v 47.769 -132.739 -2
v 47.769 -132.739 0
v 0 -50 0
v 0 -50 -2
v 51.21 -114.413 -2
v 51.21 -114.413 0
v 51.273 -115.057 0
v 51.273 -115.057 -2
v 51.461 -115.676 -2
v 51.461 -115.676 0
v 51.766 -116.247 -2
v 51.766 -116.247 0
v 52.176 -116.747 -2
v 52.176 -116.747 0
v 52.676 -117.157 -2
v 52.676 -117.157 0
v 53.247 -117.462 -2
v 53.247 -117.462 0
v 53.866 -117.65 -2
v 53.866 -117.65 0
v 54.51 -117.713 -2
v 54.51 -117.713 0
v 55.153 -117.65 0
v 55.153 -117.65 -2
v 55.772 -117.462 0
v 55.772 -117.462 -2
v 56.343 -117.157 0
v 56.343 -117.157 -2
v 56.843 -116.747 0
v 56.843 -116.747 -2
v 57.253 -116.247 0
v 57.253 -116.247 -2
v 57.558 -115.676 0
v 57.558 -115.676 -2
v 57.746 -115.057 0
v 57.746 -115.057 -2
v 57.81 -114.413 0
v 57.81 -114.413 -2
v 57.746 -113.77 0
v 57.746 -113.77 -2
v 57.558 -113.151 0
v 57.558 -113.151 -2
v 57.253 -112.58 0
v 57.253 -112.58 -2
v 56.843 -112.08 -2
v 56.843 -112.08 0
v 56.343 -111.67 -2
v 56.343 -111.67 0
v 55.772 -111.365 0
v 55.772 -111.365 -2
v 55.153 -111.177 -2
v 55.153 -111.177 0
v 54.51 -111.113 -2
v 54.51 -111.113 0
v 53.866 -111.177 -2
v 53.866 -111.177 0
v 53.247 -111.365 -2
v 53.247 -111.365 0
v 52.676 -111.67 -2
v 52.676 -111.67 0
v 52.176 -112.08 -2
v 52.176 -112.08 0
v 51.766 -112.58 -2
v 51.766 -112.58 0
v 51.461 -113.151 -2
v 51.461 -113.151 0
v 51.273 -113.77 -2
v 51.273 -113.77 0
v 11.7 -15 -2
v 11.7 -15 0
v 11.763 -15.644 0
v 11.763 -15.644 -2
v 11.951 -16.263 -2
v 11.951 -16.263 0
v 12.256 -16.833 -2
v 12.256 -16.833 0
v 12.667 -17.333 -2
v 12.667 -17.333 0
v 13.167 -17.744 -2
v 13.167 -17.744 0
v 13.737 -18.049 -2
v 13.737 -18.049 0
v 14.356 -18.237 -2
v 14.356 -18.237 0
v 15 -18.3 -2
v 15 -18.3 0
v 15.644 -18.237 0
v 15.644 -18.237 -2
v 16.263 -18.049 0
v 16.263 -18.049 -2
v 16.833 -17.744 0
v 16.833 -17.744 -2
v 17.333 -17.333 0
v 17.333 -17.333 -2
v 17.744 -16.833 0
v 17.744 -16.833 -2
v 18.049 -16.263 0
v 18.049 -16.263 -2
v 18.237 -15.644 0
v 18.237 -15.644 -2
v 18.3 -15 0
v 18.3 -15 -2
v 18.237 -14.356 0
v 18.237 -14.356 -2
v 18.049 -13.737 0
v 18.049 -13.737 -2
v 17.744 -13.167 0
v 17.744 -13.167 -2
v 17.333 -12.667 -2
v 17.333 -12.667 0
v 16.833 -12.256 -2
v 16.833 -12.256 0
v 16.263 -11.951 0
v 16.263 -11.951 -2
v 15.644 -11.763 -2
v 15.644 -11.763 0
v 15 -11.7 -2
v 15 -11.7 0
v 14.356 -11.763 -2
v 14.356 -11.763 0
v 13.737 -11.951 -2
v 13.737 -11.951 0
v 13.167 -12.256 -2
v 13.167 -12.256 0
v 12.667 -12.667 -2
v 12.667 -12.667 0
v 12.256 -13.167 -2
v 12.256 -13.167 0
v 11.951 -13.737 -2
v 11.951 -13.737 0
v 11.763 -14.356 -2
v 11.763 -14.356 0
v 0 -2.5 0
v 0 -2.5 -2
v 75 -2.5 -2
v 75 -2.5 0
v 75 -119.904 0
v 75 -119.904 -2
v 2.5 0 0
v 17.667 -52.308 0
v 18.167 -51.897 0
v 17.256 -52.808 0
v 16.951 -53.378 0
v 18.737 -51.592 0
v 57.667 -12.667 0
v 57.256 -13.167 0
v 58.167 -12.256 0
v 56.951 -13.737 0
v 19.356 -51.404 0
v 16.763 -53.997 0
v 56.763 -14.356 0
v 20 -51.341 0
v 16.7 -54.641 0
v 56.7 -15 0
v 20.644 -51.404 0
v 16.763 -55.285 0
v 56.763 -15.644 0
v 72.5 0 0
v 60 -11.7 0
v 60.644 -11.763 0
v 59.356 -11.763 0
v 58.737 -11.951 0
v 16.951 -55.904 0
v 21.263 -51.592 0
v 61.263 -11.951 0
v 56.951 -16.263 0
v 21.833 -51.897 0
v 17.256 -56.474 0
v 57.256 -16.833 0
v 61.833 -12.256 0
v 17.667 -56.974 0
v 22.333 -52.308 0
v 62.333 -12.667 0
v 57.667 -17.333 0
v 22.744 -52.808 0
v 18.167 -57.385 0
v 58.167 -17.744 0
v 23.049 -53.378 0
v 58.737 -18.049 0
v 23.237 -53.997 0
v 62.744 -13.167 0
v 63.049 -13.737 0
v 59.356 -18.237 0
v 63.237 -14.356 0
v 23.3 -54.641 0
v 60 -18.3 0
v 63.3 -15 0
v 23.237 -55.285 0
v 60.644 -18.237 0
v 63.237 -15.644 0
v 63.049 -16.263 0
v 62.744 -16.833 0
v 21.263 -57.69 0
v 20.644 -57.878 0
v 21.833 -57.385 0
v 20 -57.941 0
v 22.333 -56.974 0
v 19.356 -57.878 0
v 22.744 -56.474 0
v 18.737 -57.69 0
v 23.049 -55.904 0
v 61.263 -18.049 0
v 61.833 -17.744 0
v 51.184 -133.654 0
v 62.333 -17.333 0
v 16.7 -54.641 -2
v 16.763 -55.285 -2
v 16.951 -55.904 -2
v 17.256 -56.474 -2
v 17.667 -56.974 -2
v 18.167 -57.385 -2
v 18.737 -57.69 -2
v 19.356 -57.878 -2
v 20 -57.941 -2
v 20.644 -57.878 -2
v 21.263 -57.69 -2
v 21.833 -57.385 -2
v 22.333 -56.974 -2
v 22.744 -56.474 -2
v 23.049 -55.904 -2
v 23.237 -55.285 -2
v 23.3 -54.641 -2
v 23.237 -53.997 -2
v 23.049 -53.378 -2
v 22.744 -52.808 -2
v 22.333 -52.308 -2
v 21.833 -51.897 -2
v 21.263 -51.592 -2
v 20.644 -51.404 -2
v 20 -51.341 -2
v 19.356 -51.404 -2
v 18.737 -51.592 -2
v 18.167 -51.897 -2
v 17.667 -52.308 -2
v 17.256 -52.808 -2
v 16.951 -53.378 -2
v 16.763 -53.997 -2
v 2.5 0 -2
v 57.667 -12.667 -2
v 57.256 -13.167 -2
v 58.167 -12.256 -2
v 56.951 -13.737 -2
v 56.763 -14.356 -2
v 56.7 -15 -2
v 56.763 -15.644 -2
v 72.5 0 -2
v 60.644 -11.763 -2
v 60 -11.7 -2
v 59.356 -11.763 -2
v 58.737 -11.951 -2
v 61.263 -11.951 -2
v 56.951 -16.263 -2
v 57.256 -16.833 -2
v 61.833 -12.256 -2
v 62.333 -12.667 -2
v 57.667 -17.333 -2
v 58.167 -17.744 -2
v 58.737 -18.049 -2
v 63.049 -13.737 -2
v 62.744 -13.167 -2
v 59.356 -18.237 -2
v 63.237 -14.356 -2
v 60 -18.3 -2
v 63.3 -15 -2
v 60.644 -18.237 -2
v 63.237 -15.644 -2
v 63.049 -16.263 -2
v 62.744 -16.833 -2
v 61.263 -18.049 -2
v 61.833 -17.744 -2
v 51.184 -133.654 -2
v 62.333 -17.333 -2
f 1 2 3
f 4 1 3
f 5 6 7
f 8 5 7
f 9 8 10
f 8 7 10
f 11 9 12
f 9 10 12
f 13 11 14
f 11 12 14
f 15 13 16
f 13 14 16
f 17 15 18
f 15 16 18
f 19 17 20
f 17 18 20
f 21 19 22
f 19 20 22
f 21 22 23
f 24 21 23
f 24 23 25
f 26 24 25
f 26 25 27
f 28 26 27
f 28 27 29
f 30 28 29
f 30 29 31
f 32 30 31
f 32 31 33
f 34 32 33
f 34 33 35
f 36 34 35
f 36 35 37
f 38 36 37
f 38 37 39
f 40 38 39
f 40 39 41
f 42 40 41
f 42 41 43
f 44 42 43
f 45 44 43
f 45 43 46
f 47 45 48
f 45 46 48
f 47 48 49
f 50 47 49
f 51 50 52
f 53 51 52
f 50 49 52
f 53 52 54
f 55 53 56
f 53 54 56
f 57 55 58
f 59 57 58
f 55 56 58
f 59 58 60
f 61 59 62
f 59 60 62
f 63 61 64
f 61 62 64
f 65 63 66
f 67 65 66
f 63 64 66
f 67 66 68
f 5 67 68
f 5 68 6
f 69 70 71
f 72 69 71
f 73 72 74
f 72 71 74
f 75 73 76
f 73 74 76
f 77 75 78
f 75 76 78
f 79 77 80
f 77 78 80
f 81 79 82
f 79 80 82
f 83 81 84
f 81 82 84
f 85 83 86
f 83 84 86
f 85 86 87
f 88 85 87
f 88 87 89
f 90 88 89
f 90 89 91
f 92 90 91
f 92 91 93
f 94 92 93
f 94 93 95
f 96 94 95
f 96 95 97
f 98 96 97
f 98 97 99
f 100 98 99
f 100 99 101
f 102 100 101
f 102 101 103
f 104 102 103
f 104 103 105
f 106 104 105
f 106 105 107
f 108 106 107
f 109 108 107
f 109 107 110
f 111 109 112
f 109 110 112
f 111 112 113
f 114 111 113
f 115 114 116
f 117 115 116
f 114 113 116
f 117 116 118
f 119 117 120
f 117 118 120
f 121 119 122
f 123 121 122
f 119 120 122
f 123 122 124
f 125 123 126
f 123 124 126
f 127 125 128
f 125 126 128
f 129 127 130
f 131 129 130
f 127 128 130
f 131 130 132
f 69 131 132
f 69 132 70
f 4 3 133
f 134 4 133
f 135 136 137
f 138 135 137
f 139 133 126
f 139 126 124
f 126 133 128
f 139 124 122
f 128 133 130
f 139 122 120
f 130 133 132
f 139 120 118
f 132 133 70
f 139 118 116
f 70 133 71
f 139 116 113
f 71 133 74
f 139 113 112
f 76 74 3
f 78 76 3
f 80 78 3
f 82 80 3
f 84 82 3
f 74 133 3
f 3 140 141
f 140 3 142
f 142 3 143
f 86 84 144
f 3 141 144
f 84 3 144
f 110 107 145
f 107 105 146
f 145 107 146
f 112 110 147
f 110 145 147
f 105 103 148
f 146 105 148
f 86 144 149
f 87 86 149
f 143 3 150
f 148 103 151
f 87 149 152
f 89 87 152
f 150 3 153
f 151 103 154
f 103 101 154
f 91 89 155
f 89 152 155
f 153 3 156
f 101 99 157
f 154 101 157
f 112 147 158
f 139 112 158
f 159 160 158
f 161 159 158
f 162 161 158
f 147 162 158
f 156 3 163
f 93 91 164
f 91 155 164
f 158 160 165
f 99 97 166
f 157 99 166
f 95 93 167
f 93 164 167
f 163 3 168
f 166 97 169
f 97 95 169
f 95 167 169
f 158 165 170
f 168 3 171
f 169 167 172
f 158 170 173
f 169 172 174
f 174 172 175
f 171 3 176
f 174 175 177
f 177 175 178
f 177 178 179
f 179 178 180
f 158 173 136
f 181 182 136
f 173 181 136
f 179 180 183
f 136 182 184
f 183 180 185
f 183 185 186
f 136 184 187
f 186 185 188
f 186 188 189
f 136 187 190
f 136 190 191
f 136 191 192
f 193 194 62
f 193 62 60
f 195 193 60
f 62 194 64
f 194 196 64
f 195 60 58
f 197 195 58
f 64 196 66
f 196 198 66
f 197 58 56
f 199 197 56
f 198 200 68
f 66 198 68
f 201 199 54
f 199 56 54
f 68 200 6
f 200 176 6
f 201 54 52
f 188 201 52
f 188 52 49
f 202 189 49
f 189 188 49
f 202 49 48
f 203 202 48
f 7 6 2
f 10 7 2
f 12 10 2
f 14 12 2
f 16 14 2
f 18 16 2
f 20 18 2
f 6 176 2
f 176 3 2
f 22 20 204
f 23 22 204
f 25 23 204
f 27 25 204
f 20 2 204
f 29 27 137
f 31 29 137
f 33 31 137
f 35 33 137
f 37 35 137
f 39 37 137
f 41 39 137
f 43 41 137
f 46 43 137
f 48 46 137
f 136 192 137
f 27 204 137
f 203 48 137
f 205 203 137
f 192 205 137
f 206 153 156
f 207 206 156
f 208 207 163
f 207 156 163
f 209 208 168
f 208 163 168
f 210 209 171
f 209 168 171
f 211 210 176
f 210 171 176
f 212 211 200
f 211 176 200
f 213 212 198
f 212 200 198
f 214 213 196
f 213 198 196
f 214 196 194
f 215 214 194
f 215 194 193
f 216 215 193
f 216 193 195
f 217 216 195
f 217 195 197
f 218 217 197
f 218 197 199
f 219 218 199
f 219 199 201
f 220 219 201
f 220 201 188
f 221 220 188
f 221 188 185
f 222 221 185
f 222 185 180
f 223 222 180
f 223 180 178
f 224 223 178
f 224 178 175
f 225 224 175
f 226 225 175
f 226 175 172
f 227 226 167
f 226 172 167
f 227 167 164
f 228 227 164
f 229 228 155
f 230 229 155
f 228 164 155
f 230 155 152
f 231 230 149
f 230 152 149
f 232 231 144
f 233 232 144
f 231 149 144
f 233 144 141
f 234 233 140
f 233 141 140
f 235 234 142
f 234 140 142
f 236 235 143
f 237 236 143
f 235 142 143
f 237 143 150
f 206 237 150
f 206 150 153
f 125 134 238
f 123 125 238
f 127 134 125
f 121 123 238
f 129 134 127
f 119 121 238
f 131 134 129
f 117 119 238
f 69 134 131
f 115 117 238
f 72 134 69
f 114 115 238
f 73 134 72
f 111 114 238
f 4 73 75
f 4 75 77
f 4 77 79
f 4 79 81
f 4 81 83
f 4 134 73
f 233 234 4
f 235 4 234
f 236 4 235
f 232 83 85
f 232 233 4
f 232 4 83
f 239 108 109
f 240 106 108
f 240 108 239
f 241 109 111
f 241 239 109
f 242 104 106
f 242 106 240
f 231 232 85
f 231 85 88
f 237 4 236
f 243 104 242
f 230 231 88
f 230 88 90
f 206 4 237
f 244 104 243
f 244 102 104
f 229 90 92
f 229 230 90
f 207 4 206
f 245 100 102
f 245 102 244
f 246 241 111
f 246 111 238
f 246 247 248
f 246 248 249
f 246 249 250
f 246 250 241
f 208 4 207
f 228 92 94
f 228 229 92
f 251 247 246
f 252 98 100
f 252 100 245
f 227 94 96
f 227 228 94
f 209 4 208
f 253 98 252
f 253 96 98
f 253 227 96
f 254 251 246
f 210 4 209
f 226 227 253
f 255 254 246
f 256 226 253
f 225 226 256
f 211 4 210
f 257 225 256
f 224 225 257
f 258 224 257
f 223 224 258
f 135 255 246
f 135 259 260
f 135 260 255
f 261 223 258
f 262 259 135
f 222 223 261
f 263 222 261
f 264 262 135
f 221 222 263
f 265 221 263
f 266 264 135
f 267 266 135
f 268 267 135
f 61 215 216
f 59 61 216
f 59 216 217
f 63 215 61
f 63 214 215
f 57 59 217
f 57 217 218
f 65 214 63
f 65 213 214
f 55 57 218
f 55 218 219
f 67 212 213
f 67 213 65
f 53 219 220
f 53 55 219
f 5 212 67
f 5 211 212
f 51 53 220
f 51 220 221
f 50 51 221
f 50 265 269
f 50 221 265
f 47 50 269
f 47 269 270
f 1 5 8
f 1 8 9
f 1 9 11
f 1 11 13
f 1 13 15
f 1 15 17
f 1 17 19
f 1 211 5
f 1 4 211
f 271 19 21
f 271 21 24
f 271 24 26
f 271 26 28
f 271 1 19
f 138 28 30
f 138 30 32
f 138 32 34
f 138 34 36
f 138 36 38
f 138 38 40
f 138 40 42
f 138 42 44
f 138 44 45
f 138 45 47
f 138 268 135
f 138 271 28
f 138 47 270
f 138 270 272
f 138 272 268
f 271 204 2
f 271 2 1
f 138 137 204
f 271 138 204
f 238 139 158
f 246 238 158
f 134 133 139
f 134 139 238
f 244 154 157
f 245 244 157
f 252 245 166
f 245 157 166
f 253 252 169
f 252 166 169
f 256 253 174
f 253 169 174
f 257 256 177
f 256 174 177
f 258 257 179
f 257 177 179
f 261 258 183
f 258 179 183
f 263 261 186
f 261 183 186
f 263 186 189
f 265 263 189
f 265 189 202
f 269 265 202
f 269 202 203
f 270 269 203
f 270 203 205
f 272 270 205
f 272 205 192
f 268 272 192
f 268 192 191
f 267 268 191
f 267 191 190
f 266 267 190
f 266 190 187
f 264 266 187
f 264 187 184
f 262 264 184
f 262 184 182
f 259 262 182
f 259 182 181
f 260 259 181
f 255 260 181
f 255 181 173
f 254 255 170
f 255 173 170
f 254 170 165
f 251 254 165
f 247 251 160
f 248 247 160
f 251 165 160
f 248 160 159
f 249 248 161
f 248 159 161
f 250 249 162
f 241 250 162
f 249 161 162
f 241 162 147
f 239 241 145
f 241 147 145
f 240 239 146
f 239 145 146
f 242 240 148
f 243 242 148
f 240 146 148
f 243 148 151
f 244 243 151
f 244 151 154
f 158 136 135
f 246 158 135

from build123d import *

# Parameters (mm, degrees)
EXTRUDE_1_DEPTH   = 2
HOLE_WIZARD_M61_D = 6.6
CHAMFER_1_SIZE    = 2.5


with BuildPart() as part:
    # Эскиз3 → Бобышка-Вытянуть1 (new body)
    with BuildSketch(Plane(origin=(0, 0, 0), x_dir=(1, 0, 0), z_dir=(0, 0, -1))):
        Polygon((0, 0), (75, 0), (75, 119.903810568), (49.019237886, 134.903810568), (0, 50), align=None)
    extrude(amount=EXTRUDE_1_DEPTH)

    # Отверстие с зазором M61 (through all)
    with Locations(Plane(origin=(0, 0, -2), x_dir=(1, 0, 0), z_dir=(0, 0, -1))):
        with Locations((15, 15), (60, 15), (20, 54.641016151), (54.509618943, 114.413429511)):
            Hole(HOLE_WIZARD_M61_D / 2)

    # Фаска1
    chamfer_1_edges = [part.edges().sort_by_distance(p)[0] for p in [
        (49.019237886, -134.903810568, -1),
        (75, 0, -1),
        (0, 0, -1),
    ]]
    chamfer(chamfer_1_edges, length=CHAMFER_1_SIZE)


solid = part.part
